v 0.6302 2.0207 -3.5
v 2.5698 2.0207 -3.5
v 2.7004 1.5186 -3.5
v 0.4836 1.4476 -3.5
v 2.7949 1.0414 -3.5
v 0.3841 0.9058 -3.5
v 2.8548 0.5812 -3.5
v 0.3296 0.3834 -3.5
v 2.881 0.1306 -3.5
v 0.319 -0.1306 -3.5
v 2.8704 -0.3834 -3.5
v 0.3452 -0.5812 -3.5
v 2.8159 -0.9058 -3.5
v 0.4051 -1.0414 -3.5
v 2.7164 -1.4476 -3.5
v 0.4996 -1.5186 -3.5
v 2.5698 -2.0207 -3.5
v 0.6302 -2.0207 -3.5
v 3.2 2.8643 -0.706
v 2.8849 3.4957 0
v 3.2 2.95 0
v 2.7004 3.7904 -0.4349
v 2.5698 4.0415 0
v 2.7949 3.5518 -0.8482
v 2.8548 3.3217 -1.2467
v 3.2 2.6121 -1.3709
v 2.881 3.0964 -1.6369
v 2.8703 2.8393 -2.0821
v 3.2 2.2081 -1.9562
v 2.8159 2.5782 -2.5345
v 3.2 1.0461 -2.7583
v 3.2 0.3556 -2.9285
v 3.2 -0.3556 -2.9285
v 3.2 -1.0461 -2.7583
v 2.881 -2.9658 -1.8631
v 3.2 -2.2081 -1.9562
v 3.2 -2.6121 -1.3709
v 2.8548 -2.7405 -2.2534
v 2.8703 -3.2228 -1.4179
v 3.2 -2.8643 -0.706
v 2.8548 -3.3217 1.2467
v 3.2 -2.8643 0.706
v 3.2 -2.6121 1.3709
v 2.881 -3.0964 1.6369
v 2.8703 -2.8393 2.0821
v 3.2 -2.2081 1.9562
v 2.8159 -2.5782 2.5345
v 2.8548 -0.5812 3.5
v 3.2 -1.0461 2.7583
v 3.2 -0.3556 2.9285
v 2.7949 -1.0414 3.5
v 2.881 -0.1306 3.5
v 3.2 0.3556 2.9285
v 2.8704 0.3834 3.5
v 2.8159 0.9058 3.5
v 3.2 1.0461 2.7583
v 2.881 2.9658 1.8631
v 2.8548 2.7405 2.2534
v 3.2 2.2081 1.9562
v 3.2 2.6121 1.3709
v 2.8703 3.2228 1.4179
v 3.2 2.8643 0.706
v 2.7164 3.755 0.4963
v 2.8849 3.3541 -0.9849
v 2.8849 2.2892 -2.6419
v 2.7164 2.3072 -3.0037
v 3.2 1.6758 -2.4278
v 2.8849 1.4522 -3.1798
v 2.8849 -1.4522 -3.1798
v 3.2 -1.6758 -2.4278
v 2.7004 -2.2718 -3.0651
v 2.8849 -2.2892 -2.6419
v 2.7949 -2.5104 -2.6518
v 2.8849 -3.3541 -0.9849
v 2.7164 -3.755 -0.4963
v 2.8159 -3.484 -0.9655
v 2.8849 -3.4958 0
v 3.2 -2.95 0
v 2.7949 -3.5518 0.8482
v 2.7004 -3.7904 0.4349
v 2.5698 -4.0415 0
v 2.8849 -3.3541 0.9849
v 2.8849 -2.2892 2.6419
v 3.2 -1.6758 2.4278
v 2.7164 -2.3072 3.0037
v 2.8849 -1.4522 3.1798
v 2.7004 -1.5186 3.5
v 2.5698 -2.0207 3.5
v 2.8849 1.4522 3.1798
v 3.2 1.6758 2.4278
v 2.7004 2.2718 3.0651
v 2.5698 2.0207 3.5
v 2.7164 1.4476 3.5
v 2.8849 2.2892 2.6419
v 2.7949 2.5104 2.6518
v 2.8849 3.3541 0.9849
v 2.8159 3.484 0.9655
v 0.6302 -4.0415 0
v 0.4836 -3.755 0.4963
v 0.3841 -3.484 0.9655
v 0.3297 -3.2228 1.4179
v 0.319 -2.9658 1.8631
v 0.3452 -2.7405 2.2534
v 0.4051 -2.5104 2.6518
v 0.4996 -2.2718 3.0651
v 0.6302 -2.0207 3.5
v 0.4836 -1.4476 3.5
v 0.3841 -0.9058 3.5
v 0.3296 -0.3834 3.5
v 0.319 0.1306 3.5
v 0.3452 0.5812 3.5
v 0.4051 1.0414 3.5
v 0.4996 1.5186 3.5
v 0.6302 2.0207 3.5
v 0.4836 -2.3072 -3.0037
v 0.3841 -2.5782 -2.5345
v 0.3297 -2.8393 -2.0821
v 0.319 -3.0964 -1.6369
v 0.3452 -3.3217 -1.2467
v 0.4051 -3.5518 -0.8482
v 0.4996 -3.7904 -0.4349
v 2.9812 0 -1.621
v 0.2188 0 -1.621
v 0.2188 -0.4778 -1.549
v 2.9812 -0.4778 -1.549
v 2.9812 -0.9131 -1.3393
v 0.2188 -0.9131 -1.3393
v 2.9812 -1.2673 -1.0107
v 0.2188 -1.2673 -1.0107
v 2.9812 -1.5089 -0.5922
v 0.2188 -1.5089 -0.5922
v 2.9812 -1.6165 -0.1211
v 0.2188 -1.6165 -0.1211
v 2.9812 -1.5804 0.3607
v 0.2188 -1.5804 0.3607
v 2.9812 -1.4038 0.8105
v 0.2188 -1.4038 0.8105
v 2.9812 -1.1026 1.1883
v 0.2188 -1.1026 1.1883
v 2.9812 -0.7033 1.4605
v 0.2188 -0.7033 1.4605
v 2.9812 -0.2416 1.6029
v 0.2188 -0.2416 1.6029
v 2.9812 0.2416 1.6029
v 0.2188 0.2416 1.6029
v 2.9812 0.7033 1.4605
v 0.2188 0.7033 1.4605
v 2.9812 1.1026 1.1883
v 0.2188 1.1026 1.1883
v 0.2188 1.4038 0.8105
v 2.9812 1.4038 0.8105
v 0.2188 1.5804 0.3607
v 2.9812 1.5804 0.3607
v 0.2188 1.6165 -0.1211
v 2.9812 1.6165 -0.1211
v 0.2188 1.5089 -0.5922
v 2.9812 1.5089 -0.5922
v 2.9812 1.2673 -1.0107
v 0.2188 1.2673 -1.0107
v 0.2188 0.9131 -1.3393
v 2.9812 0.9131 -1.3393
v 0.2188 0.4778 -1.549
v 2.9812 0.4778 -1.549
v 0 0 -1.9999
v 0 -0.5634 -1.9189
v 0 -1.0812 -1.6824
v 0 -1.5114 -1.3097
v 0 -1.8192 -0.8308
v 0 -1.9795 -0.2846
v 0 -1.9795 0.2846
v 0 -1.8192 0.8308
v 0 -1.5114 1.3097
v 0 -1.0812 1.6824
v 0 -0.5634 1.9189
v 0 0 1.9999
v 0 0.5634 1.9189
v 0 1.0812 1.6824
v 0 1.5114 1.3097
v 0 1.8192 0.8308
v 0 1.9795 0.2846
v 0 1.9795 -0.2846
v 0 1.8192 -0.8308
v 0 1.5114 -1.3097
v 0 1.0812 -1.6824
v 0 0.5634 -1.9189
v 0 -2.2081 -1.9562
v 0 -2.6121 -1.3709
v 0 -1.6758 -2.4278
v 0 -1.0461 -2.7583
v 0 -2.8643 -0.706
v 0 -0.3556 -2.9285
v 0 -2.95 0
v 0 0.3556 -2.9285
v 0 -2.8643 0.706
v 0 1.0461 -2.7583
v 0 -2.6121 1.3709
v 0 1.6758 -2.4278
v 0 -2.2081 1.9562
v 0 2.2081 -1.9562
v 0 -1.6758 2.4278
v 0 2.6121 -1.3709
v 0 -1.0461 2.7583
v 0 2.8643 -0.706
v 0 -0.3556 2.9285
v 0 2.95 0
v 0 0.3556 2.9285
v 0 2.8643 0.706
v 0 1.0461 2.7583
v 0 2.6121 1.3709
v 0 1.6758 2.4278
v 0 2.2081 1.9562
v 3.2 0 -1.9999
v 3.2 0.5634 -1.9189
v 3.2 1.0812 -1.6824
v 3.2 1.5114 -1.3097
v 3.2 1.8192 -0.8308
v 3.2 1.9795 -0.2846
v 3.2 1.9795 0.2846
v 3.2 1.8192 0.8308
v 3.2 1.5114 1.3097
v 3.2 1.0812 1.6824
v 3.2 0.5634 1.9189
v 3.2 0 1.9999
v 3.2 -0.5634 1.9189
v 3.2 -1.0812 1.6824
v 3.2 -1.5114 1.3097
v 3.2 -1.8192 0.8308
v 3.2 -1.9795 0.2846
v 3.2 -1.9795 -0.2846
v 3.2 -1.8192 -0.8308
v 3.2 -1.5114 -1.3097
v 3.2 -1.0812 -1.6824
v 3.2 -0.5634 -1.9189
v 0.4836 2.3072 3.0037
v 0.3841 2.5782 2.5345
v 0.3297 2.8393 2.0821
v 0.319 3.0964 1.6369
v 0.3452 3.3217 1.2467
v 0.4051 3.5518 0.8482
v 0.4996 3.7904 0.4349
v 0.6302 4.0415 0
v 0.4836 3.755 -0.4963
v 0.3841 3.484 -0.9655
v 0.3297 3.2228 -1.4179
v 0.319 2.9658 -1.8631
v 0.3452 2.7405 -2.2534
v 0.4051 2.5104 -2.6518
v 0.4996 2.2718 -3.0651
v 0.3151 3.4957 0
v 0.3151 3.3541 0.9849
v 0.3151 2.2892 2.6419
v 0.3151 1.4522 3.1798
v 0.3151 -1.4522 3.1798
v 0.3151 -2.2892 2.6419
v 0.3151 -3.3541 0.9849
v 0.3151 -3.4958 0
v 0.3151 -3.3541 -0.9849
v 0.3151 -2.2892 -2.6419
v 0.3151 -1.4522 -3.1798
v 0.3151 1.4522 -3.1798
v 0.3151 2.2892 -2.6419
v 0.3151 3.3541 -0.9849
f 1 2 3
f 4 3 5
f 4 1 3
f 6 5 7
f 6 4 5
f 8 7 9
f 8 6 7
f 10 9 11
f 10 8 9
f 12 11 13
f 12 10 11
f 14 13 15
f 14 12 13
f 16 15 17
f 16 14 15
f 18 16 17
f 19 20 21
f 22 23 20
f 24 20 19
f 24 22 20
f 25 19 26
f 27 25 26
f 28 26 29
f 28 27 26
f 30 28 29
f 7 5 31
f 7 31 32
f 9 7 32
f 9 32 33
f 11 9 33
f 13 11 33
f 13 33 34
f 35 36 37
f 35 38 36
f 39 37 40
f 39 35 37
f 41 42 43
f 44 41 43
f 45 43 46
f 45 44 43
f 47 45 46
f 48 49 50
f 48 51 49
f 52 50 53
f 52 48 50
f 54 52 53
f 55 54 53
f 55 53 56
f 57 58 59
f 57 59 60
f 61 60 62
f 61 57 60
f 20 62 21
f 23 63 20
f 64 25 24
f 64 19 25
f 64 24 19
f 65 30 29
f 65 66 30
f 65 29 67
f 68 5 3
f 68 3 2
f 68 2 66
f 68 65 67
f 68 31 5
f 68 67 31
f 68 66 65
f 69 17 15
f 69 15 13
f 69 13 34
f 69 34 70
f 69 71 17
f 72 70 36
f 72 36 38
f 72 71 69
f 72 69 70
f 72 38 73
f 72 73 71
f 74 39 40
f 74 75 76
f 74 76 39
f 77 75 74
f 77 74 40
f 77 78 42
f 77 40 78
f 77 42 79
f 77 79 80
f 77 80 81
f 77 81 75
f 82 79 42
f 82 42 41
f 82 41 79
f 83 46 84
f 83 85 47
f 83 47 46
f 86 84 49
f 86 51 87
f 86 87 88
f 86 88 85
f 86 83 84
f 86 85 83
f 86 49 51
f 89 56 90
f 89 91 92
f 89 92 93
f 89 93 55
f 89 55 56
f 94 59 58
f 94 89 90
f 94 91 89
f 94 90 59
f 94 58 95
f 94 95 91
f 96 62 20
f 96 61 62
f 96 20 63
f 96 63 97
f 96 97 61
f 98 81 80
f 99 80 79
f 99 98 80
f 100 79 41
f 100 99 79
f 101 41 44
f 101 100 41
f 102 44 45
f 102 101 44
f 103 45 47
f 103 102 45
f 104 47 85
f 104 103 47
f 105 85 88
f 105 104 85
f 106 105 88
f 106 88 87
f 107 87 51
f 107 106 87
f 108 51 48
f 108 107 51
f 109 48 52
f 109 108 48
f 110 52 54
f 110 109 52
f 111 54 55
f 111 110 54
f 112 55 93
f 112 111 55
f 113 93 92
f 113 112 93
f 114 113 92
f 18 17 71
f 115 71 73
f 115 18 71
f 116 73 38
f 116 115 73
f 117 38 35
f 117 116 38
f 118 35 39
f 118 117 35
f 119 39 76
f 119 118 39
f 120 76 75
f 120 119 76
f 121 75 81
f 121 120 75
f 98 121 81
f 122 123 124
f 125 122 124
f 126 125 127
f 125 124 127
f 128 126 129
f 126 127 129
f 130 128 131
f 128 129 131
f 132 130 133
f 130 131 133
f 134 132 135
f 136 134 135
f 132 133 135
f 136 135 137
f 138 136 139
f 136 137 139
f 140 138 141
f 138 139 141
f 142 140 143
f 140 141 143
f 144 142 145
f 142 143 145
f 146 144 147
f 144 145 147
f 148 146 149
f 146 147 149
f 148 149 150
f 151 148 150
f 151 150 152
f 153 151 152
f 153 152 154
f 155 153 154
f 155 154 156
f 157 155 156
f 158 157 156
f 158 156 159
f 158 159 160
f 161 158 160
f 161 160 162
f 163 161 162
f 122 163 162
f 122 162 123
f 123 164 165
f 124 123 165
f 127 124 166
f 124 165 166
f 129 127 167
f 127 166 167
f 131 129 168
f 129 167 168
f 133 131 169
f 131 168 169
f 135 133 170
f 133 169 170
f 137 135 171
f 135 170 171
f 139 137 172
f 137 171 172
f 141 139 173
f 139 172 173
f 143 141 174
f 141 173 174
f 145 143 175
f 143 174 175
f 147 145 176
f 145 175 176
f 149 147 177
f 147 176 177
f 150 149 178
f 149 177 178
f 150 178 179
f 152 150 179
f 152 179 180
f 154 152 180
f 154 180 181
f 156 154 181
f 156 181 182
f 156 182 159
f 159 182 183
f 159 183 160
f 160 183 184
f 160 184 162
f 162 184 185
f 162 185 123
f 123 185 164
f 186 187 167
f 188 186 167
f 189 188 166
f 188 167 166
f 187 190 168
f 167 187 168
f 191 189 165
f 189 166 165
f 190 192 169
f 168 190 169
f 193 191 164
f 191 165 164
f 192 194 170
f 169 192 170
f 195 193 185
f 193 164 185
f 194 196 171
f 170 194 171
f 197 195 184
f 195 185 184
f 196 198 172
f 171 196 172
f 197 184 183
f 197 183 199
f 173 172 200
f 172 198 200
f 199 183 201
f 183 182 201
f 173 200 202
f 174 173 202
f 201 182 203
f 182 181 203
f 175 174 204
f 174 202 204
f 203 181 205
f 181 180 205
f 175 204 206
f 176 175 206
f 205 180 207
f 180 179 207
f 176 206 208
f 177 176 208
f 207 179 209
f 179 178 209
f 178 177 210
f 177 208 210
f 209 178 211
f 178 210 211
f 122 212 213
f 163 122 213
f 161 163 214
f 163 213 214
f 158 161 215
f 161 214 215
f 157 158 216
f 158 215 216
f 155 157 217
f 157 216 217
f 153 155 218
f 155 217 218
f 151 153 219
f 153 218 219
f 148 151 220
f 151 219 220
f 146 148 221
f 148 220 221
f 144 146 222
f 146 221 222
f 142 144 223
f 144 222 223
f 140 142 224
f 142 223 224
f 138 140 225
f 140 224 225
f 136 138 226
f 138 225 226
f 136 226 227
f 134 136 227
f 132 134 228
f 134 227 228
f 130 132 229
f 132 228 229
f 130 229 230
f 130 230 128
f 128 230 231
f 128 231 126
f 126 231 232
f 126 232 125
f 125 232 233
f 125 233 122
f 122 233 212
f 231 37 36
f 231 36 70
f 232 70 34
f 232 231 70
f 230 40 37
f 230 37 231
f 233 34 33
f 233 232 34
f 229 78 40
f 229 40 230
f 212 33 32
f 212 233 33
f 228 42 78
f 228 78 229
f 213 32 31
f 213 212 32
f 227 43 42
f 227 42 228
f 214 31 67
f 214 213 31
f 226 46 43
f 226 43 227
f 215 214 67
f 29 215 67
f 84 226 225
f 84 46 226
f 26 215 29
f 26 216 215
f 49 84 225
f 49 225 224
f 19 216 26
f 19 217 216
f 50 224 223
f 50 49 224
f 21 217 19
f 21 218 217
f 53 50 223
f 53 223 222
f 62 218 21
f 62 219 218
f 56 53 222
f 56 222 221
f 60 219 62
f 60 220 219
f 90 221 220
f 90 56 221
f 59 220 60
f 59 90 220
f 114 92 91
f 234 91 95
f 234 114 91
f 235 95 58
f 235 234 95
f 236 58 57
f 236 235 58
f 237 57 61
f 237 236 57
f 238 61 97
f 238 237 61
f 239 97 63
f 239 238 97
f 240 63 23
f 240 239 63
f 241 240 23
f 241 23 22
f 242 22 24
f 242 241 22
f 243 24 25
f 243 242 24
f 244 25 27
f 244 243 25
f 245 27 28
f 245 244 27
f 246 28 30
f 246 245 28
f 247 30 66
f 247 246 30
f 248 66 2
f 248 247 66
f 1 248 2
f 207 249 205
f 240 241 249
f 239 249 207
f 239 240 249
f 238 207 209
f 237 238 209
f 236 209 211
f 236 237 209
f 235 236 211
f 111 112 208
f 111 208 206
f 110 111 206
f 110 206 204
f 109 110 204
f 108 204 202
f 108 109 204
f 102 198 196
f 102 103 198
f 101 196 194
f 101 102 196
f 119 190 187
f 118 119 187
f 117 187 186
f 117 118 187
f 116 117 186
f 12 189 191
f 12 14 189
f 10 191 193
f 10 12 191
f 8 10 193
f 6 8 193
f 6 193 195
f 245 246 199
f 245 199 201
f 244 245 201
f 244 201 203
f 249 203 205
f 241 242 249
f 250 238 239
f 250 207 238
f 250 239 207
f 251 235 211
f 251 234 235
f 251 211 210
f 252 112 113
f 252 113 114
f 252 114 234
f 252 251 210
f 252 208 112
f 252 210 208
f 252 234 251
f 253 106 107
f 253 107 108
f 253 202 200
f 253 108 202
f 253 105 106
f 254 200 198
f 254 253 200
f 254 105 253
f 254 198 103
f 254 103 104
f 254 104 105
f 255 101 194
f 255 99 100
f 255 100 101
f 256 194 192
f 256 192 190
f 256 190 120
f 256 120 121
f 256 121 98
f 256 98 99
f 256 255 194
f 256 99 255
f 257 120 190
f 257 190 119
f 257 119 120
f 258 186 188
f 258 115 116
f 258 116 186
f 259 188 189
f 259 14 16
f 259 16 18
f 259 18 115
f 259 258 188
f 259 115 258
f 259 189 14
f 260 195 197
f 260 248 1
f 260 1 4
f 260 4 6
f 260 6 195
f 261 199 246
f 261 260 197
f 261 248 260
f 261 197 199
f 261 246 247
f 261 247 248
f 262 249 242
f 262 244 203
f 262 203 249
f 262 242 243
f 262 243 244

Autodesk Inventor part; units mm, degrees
ref_plane "YZ Plane" through (0, 0, 0) normal (1, 0, 0) x (0, 1, 0)
ref_plane "XZ Plane" through (0, 0, 0) normal (0, 1, 0) x (-1, 0, 0)
sketch "Sketch1" plane through (0, 0, 0) normal (1, 0, 0) x (0, 1, 0)
  line L0 (-4.0415, 0) -> (-2.0207, 3.5)
  line L1 (-2.0207, 3.5) -> (2.0207, 3.5)
  line L2 (2.0207, 3.5) -> (4.0415, 0)
  line L3 (4.0415, 0) -> (2.0207, -3.5)
  line L4 (2.0207, -3.5) -> (-2.0207, -3.5)
  line L5 (-2.0207, -3.5) -> (-4.0415, 0)
  point P0 (0, 0)
  point P1 (0, 0)
  dimension "d0" = 8.0829
extrude "Body" add sketch "Sketch1" along normal blind 3.2
sketch "Sketch2" plane through (0, 0, 0) normal (0, 0, 1) x (1, 0, 0)
  line L0 (0, 2.0207) -> (0, 4.0415) projected
  line L1 (0, 4.0415) -> (3.2, 4.0415) projected
  line L2 (3.2, 2.0207) -> (3.2, 4.0415) projected
  line L3 (-0.64, 0) -> (3.84, 0) projected
  line L4 (0.6302, 4.0415) -> (0, 2.95)
  line L5 (2.5698, 4.0415) -> (3.2, 2.95)
  dimension "d3" = 30
  dimension "d4" = 30
  dimension "d5" = 5.9
  dimension "d6" = 5.9
revolve "Chamfer1" cut sketch "Sketch2" angle 360 about axis through (-10, 0, 0) along (1, 0, 0)
sketch "Sketch3" plane through (3.2, 0, 0) normal (1, 0, 0) x (0, 0, -1)
  arc A0 (-0.625, -1.0825) -> (0.625, -1.0825) centre (0, 0) ccw projected
hole "Thread" at (3.2, 0, 0) direction (-1, 0, 0) diameter 3.242 end through all thread size "M4x0.7" class "6H" standard "ISO Metric profile"
chamfer "Chamfer2" distance 0.3789 angle 30 1 edges at (3.2, 0, 1.621) measured on face at (3.2, 2.4745, -0.3005)
chamfer "Chamfer3" distance 0.3789 angle 30 1 edges at (0, 0, 1.621) measured on face at (0, 2.4745, -0.3005)
ref_plane "Work Plane1" through (-7.9612, 0, 0) normal (0, -0.866, -0.5) x (1, 0, 0)
equation "\"d0\" = 1.1547 * SW"
equation "\"d1\" = KOH"
equation "\"d3\" = ANG1"
equation "\"d4\" = ANG2"
equation "\"d5\" = SW0"
equation "\"d6\" = SW01"
equation "\"d8\" = -0.5 * GD1 + 0.5 * NND"
equation "\"d40\" = -0.5 * GD1 + 0.5 * NND"
equation "\"d10\" = -0.5 * GD1 + 0.5 * NND"
equation "\"d41\" = -0.5 * GD1 + 0.5 * NND"
equation "\"ANG1\" = 30deg"
equation "\"ANG2\" = 30deg"
equation "\"NND\" = 4"
equation "\"KOH\" = 3.2"
equation "\"SW\" = 7"
equation "\"SW0\" = 5.9"
equation "\"SW01\" = 5.9"
equation "\"GUL\" = 0.541266 * PTC"
equation "\"THREADDIA\" = 4"
equation "\"TOA\" = 30deg"
equation "\"PTC\" = 0.7"
equation "\"E0\" = 1.155 * SW"
equation "\"GAL\" = 0.541266 * PTC"
equation "\"GD1\" = 3.242228"
properties part number "ISO 4032 - M4" material "Stainless Steel, 440C"
